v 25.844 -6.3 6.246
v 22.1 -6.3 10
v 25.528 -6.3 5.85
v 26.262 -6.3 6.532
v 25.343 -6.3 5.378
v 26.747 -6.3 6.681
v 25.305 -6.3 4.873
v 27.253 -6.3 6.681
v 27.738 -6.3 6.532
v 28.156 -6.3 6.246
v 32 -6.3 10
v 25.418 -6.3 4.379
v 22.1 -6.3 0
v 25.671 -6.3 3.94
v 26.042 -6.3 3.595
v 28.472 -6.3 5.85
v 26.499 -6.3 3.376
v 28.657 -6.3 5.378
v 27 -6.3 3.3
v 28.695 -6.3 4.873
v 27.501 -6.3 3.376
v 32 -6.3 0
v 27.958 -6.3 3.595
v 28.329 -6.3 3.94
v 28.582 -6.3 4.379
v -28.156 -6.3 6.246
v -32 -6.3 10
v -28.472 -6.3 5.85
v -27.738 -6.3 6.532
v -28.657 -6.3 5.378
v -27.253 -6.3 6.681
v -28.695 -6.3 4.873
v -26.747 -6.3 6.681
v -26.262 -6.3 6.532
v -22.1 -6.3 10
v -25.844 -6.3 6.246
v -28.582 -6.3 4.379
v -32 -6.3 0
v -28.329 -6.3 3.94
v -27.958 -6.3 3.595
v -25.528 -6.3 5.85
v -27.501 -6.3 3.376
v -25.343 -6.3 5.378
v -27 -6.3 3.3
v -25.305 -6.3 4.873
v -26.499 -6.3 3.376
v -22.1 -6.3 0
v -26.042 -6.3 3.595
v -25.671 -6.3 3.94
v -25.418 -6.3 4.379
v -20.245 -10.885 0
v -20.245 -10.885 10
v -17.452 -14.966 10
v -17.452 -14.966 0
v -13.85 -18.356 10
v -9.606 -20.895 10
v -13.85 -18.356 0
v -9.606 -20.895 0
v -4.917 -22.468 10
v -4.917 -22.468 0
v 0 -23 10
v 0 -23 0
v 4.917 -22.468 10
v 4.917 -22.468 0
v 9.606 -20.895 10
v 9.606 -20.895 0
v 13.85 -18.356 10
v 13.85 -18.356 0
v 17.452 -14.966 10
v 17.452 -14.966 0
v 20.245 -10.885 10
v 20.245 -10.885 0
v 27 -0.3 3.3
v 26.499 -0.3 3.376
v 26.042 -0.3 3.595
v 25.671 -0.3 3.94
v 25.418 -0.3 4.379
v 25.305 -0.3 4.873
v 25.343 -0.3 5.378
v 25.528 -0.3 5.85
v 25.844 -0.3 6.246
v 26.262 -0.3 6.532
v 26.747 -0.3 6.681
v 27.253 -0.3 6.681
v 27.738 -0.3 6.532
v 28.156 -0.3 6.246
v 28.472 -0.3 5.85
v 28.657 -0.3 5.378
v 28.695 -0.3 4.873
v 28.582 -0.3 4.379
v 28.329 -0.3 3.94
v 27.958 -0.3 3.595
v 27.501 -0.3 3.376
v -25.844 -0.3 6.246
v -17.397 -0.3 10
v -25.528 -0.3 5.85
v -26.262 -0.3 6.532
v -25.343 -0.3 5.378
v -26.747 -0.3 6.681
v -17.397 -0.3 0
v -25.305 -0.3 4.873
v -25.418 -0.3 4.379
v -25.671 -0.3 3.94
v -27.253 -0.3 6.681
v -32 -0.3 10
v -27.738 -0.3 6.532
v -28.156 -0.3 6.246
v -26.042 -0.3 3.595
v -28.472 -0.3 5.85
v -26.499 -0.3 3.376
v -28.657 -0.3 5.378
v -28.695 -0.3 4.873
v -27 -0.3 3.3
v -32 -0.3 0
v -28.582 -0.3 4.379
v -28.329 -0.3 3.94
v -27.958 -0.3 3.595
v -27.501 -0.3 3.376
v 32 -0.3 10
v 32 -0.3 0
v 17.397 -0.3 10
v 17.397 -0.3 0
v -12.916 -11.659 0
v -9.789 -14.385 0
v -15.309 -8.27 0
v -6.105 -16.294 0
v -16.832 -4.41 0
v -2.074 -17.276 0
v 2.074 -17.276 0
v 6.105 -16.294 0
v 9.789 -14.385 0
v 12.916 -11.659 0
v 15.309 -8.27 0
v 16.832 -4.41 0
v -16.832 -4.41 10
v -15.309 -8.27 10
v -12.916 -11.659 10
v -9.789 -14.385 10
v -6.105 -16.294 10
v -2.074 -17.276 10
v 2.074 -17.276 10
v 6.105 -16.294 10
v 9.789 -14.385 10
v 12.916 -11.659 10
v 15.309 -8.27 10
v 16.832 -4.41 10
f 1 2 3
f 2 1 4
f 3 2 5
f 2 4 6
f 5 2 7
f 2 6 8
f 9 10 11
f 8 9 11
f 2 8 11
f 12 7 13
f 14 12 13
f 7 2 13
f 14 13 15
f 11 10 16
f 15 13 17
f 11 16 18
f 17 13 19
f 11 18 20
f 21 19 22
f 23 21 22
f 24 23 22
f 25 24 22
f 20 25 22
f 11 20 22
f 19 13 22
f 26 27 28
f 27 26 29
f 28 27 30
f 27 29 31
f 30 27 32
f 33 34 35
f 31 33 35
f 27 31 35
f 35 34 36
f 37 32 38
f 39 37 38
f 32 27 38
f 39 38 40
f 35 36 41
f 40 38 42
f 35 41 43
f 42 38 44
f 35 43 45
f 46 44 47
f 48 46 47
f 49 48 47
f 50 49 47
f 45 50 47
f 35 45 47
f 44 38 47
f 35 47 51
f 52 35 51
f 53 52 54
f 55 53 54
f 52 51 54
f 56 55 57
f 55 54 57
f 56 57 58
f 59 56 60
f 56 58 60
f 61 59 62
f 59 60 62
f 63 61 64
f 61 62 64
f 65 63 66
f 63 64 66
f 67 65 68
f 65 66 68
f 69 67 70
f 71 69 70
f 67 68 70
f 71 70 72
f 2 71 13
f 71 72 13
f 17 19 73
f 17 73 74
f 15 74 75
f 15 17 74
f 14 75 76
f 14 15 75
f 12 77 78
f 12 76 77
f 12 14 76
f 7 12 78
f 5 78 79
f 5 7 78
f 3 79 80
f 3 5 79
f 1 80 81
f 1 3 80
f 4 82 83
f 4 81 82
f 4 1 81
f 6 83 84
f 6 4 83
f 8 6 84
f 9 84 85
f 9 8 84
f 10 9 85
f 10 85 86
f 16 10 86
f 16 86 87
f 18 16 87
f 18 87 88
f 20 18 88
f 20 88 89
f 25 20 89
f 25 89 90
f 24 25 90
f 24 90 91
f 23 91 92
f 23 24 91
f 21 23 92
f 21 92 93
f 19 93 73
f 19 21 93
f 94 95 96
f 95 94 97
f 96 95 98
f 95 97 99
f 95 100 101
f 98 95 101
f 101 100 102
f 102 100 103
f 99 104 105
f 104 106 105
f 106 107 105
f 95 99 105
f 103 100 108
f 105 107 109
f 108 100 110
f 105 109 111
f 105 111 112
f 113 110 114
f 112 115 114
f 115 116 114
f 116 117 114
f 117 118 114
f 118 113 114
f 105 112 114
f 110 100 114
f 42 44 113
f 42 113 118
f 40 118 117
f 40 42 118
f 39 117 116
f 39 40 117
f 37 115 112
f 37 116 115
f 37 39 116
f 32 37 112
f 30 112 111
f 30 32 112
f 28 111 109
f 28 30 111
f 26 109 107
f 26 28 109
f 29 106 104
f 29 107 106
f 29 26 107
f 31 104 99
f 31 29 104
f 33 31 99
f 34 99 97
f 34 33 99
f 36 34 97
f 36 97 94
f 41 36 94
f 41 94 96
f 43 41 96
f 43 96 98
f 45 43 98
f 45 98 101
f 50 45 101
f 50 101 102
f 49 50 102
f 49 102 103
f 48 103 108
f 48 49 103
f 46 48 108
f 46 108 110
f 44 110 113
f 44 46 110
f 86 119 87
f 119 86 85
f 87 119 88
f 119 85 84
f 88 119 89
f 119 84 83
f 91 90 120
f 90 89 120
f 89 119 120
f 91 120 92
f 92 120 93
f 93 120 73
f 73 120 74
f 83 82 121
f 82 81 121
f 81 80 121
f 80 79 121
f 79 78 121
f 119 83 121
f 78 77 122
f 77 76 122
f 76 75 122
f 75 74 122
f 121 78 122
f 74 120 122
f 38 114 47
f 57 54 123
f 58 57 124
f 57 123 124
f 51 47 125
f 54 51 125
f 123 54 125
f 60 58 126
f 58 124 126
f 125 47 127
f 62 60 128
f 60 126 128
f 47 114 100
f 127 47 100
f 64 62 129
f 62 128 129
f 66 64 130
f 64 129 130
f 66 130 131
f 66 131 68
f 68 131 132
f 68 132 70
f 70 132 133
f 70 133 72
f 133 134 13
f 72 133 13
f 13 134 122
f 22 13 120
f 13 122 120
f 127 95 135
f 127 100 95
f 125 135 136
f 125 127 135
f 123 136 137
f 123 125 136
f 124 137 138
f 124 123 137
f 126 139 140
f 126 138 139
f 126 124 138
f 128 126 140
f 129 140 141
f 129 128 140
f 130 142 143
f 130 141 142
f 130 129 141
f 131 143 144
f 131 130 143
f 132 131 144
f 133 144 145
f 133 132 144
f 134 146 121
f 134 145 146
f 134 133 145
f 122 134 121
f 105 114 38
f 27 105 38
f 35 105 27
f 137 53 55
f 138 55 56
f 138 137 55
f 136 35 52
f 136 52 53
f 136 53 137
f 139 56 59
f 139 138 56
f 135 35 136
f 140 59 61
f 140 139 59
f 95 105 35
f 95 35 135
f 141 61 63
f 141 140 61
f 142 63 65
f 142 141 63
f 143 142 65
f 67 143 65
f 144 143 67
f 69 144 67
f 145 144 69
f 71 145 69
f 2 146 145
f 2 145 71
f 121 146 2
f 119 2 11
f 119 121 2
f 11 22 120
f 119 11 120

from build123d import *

# Parameters (mm, degrees)
F_01_REAR_SEMICIRCULAR_CAP_AND_BOLT_EARS_DEPTH = 10
F_02_START                                     = -0.2
S02_MATING_MOTOR_CAN_R                         = 17.4
F_02_MATING_MOTOR_CAN_DEPTH                    = 10.4
F_03_START                                     = -6.5
S03_TWO_M3_CLAMP_SCREWS_R                      = 1.7
F_03_TWO_M3_CLAMP_SCREWS_DEPTH                 = 6.7


with BuildPart() as part:
    # S01 - Rear semicircular cap and bolt ears → 01 - Rear semicircular cap and bolt ears (new body)
    with BuildSketch(Plane.XY):
        with BuildLine():
            Line((-32, -0.3), (-32, -6.3))
            Line((-32, -6.3), (-22.1, -6.3))
            ThreePointArc((-22.1, -6.3), (0, -23), (22.1, -6.3))
            Line((22.1, -6.3), (32, -6.3))
            Line((32, -6.3), (32, -0.3))
            Line((32, -0.3), (-32, -0.3))
        make_face()
    extrude(amount=F_01_REAR_SEMICIRCULAR_CAP_AND_BOLT_EARS_DEPTH)

    # S02 - Mating motor can → 02 - Mating motor can (cut)
    with BuildSketch(Plane.XY.offset(F_02_START)):
        Circle(S02_MATING_MOTOR_CAN_R)
    extrude(amount=F_02_MATING_MOTOR_CAN_DEPTH, mode=Mode.SUBTRACT)

    # S03 - Two M3 clamp screws → 03 - Two M3 clamp screws (cut)
    with BuildSketch(Plane(origin=(0, 0, 0), x_dir=(1, 0, 0), z_dir=(0, 1, 0)).offset(F_03_START)):
        with Locations(Location((-27, -5, 0), (0, 0, 90))):
            Circle(S03_TWO_M3_CLAMP_SCREWS_R)
        with Locations(Location((27, -5, 0), (0, 0, 90))):
            Circle(S03_TWO_M3_CLAMP_SCREWS_R)
    extrude(amount=F_03_TWO_M3_CLAMP_SCREWS_DEPTH, mode=Mode.SUBTRACT)


solid = part.part
